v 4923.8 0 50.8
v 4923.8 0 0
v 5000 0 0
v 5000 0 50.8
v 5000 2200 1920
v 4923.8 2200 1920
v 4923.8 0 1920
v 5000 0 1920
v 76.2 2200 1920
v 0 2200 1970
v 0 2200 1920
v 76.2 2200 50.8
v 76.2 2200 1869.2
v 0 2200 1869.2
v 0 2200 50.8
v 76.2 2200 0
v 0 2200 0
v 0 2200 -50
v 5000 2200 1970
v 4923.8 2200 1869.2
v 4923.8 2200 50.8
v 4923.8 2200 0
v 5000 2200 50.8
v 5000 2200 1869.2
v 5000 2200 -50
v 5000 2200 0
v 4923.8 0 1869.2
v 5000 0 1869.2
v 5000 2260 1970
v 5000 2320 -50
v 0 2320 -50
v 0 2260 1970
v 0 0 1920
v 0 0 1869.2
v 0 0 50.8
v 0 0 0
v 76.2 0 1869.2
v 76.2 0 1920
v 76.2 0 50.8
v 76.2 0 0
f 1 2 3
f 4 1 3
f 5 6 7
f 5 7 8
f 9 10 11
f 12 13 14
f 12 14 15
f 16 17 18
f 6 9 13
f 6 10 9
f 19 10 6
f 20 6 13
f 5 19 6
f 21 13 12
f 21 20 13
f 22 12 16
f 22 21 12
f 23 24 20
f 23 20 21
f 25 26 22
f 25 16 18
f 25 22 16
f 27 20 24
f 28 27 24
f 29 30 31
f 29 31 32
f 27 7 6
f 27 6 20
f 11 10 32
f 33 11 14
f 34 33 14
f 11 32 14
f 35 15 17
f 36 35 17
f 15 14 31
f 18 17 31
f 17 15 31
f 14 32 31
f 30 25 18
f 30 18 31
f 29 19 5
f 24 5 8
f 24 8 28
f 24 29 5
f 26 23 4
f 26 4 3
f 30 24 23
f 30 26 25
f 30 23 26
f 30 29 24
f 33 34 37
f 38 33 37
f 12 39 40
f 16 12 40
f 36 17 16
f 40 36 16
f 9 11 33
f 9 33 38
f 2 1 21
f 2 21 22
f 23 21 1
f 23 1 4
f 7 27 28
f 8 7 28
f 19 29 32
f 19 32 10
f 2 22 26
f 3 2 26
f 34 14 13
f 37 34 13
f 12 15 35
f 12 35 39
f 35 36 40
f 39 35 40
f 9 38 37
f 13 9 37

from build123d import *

# Parameters (mm, degrees)
CROQUIS2_W                = 76.2
CROQUIS2_H                = 50.8
SALIENTE_EXTRUIR1_DEPTH   = 2200
SALIENTE_EXTRUIR1_2_DEPTH = 2200
SALIENTE_EXTRUIR1_3_DEPTH = 2200
SALIENTE_EXTRUIR1_4_DEPTH = 2200
SALIENTE_EXTRUIR2_DEPTH   = 5000


with BuildPart() as part:
    # Croquis2 → Saliente-Extruir1 (new body)
    with BuildSketch(Plane(origin=(0, 0, 0), x_dir=(1, 0, 0), z_dir=(0, 1, 0))):
        with Locations((38.1, -25.4)):
            Rectangle(CROQUIS2_W, CROQUIS2_H)
    extrude(amount=SALIENTE_EXTRUIR1_DEPTH)



with BuildPart() as body_2:
    # Croquis2 → Saliente-Extruir1 2 (new body)
    with BuildSketch(Plane(origin=(0, 0, 0), x_dir=(1, 0, 0), z_dir=(0, 1, 0))):
        with Locations((4961.9, -25.4)):
            Rectangle(CROQUIS2_W, CROQUIS2_H)
    extrude(amount=SALIENTE_EXTRUIR1_2_DEPTH)


with BuildPart() as body_3:
    # Croquis2 → Saliente-Extruir1 3 (new body)
    with BuildSketch(Plane(origin=(0, 0, 0), x_dir=(1, 0, 0), z_dir=(0, 1, 0))):
        with Locations((4961.9, -1894.6)):
            Rectangle(CROQUIS2_W, CROQUIS2_H)
    extrude(amount=SALIENTE_EXTRUIR1_3_DEPTH)


with BuildPart() as body_4:
    # Croquis2 → Saliente-Extruir1 4 (new body)
    with BuildSketch(Plane(origin=(0, 0, 0), x_dir=(1, 0, 0), z_dir=(0, 1, 0))):
        with Locations((38.1, -1894.6)):
            Rectangle(CROQUIS2_W, CROQUIS2_H)
    extrude(amount=SALIENTE_EXTRUIR1_4_DEPTH)


with BuildPart() as part_1:
    add(part.part)

    add(body_2.part)  # Saliente-Extruir2 merges body 2

    add(body_3.part)  # Saliente-Extruir2 merges body 3

    add(body_4.part)  # Saliente-Extruir2 merges body 4
    # Croquis3 → Saliente-Extruir2 (add)
    with BuildSketch(Plane(origin=(5000, 0, 0), x_dir=(0, 0, -1), z_dir=(1, 0, 0))):
        Polygon((-1970, 2200), (50, 2200), (50, 2320), (-1970, 2260), align=None)
    extrude(amount=-SALIENTE_EXTRUIR2_DEPTH)


solid = part_1.part
